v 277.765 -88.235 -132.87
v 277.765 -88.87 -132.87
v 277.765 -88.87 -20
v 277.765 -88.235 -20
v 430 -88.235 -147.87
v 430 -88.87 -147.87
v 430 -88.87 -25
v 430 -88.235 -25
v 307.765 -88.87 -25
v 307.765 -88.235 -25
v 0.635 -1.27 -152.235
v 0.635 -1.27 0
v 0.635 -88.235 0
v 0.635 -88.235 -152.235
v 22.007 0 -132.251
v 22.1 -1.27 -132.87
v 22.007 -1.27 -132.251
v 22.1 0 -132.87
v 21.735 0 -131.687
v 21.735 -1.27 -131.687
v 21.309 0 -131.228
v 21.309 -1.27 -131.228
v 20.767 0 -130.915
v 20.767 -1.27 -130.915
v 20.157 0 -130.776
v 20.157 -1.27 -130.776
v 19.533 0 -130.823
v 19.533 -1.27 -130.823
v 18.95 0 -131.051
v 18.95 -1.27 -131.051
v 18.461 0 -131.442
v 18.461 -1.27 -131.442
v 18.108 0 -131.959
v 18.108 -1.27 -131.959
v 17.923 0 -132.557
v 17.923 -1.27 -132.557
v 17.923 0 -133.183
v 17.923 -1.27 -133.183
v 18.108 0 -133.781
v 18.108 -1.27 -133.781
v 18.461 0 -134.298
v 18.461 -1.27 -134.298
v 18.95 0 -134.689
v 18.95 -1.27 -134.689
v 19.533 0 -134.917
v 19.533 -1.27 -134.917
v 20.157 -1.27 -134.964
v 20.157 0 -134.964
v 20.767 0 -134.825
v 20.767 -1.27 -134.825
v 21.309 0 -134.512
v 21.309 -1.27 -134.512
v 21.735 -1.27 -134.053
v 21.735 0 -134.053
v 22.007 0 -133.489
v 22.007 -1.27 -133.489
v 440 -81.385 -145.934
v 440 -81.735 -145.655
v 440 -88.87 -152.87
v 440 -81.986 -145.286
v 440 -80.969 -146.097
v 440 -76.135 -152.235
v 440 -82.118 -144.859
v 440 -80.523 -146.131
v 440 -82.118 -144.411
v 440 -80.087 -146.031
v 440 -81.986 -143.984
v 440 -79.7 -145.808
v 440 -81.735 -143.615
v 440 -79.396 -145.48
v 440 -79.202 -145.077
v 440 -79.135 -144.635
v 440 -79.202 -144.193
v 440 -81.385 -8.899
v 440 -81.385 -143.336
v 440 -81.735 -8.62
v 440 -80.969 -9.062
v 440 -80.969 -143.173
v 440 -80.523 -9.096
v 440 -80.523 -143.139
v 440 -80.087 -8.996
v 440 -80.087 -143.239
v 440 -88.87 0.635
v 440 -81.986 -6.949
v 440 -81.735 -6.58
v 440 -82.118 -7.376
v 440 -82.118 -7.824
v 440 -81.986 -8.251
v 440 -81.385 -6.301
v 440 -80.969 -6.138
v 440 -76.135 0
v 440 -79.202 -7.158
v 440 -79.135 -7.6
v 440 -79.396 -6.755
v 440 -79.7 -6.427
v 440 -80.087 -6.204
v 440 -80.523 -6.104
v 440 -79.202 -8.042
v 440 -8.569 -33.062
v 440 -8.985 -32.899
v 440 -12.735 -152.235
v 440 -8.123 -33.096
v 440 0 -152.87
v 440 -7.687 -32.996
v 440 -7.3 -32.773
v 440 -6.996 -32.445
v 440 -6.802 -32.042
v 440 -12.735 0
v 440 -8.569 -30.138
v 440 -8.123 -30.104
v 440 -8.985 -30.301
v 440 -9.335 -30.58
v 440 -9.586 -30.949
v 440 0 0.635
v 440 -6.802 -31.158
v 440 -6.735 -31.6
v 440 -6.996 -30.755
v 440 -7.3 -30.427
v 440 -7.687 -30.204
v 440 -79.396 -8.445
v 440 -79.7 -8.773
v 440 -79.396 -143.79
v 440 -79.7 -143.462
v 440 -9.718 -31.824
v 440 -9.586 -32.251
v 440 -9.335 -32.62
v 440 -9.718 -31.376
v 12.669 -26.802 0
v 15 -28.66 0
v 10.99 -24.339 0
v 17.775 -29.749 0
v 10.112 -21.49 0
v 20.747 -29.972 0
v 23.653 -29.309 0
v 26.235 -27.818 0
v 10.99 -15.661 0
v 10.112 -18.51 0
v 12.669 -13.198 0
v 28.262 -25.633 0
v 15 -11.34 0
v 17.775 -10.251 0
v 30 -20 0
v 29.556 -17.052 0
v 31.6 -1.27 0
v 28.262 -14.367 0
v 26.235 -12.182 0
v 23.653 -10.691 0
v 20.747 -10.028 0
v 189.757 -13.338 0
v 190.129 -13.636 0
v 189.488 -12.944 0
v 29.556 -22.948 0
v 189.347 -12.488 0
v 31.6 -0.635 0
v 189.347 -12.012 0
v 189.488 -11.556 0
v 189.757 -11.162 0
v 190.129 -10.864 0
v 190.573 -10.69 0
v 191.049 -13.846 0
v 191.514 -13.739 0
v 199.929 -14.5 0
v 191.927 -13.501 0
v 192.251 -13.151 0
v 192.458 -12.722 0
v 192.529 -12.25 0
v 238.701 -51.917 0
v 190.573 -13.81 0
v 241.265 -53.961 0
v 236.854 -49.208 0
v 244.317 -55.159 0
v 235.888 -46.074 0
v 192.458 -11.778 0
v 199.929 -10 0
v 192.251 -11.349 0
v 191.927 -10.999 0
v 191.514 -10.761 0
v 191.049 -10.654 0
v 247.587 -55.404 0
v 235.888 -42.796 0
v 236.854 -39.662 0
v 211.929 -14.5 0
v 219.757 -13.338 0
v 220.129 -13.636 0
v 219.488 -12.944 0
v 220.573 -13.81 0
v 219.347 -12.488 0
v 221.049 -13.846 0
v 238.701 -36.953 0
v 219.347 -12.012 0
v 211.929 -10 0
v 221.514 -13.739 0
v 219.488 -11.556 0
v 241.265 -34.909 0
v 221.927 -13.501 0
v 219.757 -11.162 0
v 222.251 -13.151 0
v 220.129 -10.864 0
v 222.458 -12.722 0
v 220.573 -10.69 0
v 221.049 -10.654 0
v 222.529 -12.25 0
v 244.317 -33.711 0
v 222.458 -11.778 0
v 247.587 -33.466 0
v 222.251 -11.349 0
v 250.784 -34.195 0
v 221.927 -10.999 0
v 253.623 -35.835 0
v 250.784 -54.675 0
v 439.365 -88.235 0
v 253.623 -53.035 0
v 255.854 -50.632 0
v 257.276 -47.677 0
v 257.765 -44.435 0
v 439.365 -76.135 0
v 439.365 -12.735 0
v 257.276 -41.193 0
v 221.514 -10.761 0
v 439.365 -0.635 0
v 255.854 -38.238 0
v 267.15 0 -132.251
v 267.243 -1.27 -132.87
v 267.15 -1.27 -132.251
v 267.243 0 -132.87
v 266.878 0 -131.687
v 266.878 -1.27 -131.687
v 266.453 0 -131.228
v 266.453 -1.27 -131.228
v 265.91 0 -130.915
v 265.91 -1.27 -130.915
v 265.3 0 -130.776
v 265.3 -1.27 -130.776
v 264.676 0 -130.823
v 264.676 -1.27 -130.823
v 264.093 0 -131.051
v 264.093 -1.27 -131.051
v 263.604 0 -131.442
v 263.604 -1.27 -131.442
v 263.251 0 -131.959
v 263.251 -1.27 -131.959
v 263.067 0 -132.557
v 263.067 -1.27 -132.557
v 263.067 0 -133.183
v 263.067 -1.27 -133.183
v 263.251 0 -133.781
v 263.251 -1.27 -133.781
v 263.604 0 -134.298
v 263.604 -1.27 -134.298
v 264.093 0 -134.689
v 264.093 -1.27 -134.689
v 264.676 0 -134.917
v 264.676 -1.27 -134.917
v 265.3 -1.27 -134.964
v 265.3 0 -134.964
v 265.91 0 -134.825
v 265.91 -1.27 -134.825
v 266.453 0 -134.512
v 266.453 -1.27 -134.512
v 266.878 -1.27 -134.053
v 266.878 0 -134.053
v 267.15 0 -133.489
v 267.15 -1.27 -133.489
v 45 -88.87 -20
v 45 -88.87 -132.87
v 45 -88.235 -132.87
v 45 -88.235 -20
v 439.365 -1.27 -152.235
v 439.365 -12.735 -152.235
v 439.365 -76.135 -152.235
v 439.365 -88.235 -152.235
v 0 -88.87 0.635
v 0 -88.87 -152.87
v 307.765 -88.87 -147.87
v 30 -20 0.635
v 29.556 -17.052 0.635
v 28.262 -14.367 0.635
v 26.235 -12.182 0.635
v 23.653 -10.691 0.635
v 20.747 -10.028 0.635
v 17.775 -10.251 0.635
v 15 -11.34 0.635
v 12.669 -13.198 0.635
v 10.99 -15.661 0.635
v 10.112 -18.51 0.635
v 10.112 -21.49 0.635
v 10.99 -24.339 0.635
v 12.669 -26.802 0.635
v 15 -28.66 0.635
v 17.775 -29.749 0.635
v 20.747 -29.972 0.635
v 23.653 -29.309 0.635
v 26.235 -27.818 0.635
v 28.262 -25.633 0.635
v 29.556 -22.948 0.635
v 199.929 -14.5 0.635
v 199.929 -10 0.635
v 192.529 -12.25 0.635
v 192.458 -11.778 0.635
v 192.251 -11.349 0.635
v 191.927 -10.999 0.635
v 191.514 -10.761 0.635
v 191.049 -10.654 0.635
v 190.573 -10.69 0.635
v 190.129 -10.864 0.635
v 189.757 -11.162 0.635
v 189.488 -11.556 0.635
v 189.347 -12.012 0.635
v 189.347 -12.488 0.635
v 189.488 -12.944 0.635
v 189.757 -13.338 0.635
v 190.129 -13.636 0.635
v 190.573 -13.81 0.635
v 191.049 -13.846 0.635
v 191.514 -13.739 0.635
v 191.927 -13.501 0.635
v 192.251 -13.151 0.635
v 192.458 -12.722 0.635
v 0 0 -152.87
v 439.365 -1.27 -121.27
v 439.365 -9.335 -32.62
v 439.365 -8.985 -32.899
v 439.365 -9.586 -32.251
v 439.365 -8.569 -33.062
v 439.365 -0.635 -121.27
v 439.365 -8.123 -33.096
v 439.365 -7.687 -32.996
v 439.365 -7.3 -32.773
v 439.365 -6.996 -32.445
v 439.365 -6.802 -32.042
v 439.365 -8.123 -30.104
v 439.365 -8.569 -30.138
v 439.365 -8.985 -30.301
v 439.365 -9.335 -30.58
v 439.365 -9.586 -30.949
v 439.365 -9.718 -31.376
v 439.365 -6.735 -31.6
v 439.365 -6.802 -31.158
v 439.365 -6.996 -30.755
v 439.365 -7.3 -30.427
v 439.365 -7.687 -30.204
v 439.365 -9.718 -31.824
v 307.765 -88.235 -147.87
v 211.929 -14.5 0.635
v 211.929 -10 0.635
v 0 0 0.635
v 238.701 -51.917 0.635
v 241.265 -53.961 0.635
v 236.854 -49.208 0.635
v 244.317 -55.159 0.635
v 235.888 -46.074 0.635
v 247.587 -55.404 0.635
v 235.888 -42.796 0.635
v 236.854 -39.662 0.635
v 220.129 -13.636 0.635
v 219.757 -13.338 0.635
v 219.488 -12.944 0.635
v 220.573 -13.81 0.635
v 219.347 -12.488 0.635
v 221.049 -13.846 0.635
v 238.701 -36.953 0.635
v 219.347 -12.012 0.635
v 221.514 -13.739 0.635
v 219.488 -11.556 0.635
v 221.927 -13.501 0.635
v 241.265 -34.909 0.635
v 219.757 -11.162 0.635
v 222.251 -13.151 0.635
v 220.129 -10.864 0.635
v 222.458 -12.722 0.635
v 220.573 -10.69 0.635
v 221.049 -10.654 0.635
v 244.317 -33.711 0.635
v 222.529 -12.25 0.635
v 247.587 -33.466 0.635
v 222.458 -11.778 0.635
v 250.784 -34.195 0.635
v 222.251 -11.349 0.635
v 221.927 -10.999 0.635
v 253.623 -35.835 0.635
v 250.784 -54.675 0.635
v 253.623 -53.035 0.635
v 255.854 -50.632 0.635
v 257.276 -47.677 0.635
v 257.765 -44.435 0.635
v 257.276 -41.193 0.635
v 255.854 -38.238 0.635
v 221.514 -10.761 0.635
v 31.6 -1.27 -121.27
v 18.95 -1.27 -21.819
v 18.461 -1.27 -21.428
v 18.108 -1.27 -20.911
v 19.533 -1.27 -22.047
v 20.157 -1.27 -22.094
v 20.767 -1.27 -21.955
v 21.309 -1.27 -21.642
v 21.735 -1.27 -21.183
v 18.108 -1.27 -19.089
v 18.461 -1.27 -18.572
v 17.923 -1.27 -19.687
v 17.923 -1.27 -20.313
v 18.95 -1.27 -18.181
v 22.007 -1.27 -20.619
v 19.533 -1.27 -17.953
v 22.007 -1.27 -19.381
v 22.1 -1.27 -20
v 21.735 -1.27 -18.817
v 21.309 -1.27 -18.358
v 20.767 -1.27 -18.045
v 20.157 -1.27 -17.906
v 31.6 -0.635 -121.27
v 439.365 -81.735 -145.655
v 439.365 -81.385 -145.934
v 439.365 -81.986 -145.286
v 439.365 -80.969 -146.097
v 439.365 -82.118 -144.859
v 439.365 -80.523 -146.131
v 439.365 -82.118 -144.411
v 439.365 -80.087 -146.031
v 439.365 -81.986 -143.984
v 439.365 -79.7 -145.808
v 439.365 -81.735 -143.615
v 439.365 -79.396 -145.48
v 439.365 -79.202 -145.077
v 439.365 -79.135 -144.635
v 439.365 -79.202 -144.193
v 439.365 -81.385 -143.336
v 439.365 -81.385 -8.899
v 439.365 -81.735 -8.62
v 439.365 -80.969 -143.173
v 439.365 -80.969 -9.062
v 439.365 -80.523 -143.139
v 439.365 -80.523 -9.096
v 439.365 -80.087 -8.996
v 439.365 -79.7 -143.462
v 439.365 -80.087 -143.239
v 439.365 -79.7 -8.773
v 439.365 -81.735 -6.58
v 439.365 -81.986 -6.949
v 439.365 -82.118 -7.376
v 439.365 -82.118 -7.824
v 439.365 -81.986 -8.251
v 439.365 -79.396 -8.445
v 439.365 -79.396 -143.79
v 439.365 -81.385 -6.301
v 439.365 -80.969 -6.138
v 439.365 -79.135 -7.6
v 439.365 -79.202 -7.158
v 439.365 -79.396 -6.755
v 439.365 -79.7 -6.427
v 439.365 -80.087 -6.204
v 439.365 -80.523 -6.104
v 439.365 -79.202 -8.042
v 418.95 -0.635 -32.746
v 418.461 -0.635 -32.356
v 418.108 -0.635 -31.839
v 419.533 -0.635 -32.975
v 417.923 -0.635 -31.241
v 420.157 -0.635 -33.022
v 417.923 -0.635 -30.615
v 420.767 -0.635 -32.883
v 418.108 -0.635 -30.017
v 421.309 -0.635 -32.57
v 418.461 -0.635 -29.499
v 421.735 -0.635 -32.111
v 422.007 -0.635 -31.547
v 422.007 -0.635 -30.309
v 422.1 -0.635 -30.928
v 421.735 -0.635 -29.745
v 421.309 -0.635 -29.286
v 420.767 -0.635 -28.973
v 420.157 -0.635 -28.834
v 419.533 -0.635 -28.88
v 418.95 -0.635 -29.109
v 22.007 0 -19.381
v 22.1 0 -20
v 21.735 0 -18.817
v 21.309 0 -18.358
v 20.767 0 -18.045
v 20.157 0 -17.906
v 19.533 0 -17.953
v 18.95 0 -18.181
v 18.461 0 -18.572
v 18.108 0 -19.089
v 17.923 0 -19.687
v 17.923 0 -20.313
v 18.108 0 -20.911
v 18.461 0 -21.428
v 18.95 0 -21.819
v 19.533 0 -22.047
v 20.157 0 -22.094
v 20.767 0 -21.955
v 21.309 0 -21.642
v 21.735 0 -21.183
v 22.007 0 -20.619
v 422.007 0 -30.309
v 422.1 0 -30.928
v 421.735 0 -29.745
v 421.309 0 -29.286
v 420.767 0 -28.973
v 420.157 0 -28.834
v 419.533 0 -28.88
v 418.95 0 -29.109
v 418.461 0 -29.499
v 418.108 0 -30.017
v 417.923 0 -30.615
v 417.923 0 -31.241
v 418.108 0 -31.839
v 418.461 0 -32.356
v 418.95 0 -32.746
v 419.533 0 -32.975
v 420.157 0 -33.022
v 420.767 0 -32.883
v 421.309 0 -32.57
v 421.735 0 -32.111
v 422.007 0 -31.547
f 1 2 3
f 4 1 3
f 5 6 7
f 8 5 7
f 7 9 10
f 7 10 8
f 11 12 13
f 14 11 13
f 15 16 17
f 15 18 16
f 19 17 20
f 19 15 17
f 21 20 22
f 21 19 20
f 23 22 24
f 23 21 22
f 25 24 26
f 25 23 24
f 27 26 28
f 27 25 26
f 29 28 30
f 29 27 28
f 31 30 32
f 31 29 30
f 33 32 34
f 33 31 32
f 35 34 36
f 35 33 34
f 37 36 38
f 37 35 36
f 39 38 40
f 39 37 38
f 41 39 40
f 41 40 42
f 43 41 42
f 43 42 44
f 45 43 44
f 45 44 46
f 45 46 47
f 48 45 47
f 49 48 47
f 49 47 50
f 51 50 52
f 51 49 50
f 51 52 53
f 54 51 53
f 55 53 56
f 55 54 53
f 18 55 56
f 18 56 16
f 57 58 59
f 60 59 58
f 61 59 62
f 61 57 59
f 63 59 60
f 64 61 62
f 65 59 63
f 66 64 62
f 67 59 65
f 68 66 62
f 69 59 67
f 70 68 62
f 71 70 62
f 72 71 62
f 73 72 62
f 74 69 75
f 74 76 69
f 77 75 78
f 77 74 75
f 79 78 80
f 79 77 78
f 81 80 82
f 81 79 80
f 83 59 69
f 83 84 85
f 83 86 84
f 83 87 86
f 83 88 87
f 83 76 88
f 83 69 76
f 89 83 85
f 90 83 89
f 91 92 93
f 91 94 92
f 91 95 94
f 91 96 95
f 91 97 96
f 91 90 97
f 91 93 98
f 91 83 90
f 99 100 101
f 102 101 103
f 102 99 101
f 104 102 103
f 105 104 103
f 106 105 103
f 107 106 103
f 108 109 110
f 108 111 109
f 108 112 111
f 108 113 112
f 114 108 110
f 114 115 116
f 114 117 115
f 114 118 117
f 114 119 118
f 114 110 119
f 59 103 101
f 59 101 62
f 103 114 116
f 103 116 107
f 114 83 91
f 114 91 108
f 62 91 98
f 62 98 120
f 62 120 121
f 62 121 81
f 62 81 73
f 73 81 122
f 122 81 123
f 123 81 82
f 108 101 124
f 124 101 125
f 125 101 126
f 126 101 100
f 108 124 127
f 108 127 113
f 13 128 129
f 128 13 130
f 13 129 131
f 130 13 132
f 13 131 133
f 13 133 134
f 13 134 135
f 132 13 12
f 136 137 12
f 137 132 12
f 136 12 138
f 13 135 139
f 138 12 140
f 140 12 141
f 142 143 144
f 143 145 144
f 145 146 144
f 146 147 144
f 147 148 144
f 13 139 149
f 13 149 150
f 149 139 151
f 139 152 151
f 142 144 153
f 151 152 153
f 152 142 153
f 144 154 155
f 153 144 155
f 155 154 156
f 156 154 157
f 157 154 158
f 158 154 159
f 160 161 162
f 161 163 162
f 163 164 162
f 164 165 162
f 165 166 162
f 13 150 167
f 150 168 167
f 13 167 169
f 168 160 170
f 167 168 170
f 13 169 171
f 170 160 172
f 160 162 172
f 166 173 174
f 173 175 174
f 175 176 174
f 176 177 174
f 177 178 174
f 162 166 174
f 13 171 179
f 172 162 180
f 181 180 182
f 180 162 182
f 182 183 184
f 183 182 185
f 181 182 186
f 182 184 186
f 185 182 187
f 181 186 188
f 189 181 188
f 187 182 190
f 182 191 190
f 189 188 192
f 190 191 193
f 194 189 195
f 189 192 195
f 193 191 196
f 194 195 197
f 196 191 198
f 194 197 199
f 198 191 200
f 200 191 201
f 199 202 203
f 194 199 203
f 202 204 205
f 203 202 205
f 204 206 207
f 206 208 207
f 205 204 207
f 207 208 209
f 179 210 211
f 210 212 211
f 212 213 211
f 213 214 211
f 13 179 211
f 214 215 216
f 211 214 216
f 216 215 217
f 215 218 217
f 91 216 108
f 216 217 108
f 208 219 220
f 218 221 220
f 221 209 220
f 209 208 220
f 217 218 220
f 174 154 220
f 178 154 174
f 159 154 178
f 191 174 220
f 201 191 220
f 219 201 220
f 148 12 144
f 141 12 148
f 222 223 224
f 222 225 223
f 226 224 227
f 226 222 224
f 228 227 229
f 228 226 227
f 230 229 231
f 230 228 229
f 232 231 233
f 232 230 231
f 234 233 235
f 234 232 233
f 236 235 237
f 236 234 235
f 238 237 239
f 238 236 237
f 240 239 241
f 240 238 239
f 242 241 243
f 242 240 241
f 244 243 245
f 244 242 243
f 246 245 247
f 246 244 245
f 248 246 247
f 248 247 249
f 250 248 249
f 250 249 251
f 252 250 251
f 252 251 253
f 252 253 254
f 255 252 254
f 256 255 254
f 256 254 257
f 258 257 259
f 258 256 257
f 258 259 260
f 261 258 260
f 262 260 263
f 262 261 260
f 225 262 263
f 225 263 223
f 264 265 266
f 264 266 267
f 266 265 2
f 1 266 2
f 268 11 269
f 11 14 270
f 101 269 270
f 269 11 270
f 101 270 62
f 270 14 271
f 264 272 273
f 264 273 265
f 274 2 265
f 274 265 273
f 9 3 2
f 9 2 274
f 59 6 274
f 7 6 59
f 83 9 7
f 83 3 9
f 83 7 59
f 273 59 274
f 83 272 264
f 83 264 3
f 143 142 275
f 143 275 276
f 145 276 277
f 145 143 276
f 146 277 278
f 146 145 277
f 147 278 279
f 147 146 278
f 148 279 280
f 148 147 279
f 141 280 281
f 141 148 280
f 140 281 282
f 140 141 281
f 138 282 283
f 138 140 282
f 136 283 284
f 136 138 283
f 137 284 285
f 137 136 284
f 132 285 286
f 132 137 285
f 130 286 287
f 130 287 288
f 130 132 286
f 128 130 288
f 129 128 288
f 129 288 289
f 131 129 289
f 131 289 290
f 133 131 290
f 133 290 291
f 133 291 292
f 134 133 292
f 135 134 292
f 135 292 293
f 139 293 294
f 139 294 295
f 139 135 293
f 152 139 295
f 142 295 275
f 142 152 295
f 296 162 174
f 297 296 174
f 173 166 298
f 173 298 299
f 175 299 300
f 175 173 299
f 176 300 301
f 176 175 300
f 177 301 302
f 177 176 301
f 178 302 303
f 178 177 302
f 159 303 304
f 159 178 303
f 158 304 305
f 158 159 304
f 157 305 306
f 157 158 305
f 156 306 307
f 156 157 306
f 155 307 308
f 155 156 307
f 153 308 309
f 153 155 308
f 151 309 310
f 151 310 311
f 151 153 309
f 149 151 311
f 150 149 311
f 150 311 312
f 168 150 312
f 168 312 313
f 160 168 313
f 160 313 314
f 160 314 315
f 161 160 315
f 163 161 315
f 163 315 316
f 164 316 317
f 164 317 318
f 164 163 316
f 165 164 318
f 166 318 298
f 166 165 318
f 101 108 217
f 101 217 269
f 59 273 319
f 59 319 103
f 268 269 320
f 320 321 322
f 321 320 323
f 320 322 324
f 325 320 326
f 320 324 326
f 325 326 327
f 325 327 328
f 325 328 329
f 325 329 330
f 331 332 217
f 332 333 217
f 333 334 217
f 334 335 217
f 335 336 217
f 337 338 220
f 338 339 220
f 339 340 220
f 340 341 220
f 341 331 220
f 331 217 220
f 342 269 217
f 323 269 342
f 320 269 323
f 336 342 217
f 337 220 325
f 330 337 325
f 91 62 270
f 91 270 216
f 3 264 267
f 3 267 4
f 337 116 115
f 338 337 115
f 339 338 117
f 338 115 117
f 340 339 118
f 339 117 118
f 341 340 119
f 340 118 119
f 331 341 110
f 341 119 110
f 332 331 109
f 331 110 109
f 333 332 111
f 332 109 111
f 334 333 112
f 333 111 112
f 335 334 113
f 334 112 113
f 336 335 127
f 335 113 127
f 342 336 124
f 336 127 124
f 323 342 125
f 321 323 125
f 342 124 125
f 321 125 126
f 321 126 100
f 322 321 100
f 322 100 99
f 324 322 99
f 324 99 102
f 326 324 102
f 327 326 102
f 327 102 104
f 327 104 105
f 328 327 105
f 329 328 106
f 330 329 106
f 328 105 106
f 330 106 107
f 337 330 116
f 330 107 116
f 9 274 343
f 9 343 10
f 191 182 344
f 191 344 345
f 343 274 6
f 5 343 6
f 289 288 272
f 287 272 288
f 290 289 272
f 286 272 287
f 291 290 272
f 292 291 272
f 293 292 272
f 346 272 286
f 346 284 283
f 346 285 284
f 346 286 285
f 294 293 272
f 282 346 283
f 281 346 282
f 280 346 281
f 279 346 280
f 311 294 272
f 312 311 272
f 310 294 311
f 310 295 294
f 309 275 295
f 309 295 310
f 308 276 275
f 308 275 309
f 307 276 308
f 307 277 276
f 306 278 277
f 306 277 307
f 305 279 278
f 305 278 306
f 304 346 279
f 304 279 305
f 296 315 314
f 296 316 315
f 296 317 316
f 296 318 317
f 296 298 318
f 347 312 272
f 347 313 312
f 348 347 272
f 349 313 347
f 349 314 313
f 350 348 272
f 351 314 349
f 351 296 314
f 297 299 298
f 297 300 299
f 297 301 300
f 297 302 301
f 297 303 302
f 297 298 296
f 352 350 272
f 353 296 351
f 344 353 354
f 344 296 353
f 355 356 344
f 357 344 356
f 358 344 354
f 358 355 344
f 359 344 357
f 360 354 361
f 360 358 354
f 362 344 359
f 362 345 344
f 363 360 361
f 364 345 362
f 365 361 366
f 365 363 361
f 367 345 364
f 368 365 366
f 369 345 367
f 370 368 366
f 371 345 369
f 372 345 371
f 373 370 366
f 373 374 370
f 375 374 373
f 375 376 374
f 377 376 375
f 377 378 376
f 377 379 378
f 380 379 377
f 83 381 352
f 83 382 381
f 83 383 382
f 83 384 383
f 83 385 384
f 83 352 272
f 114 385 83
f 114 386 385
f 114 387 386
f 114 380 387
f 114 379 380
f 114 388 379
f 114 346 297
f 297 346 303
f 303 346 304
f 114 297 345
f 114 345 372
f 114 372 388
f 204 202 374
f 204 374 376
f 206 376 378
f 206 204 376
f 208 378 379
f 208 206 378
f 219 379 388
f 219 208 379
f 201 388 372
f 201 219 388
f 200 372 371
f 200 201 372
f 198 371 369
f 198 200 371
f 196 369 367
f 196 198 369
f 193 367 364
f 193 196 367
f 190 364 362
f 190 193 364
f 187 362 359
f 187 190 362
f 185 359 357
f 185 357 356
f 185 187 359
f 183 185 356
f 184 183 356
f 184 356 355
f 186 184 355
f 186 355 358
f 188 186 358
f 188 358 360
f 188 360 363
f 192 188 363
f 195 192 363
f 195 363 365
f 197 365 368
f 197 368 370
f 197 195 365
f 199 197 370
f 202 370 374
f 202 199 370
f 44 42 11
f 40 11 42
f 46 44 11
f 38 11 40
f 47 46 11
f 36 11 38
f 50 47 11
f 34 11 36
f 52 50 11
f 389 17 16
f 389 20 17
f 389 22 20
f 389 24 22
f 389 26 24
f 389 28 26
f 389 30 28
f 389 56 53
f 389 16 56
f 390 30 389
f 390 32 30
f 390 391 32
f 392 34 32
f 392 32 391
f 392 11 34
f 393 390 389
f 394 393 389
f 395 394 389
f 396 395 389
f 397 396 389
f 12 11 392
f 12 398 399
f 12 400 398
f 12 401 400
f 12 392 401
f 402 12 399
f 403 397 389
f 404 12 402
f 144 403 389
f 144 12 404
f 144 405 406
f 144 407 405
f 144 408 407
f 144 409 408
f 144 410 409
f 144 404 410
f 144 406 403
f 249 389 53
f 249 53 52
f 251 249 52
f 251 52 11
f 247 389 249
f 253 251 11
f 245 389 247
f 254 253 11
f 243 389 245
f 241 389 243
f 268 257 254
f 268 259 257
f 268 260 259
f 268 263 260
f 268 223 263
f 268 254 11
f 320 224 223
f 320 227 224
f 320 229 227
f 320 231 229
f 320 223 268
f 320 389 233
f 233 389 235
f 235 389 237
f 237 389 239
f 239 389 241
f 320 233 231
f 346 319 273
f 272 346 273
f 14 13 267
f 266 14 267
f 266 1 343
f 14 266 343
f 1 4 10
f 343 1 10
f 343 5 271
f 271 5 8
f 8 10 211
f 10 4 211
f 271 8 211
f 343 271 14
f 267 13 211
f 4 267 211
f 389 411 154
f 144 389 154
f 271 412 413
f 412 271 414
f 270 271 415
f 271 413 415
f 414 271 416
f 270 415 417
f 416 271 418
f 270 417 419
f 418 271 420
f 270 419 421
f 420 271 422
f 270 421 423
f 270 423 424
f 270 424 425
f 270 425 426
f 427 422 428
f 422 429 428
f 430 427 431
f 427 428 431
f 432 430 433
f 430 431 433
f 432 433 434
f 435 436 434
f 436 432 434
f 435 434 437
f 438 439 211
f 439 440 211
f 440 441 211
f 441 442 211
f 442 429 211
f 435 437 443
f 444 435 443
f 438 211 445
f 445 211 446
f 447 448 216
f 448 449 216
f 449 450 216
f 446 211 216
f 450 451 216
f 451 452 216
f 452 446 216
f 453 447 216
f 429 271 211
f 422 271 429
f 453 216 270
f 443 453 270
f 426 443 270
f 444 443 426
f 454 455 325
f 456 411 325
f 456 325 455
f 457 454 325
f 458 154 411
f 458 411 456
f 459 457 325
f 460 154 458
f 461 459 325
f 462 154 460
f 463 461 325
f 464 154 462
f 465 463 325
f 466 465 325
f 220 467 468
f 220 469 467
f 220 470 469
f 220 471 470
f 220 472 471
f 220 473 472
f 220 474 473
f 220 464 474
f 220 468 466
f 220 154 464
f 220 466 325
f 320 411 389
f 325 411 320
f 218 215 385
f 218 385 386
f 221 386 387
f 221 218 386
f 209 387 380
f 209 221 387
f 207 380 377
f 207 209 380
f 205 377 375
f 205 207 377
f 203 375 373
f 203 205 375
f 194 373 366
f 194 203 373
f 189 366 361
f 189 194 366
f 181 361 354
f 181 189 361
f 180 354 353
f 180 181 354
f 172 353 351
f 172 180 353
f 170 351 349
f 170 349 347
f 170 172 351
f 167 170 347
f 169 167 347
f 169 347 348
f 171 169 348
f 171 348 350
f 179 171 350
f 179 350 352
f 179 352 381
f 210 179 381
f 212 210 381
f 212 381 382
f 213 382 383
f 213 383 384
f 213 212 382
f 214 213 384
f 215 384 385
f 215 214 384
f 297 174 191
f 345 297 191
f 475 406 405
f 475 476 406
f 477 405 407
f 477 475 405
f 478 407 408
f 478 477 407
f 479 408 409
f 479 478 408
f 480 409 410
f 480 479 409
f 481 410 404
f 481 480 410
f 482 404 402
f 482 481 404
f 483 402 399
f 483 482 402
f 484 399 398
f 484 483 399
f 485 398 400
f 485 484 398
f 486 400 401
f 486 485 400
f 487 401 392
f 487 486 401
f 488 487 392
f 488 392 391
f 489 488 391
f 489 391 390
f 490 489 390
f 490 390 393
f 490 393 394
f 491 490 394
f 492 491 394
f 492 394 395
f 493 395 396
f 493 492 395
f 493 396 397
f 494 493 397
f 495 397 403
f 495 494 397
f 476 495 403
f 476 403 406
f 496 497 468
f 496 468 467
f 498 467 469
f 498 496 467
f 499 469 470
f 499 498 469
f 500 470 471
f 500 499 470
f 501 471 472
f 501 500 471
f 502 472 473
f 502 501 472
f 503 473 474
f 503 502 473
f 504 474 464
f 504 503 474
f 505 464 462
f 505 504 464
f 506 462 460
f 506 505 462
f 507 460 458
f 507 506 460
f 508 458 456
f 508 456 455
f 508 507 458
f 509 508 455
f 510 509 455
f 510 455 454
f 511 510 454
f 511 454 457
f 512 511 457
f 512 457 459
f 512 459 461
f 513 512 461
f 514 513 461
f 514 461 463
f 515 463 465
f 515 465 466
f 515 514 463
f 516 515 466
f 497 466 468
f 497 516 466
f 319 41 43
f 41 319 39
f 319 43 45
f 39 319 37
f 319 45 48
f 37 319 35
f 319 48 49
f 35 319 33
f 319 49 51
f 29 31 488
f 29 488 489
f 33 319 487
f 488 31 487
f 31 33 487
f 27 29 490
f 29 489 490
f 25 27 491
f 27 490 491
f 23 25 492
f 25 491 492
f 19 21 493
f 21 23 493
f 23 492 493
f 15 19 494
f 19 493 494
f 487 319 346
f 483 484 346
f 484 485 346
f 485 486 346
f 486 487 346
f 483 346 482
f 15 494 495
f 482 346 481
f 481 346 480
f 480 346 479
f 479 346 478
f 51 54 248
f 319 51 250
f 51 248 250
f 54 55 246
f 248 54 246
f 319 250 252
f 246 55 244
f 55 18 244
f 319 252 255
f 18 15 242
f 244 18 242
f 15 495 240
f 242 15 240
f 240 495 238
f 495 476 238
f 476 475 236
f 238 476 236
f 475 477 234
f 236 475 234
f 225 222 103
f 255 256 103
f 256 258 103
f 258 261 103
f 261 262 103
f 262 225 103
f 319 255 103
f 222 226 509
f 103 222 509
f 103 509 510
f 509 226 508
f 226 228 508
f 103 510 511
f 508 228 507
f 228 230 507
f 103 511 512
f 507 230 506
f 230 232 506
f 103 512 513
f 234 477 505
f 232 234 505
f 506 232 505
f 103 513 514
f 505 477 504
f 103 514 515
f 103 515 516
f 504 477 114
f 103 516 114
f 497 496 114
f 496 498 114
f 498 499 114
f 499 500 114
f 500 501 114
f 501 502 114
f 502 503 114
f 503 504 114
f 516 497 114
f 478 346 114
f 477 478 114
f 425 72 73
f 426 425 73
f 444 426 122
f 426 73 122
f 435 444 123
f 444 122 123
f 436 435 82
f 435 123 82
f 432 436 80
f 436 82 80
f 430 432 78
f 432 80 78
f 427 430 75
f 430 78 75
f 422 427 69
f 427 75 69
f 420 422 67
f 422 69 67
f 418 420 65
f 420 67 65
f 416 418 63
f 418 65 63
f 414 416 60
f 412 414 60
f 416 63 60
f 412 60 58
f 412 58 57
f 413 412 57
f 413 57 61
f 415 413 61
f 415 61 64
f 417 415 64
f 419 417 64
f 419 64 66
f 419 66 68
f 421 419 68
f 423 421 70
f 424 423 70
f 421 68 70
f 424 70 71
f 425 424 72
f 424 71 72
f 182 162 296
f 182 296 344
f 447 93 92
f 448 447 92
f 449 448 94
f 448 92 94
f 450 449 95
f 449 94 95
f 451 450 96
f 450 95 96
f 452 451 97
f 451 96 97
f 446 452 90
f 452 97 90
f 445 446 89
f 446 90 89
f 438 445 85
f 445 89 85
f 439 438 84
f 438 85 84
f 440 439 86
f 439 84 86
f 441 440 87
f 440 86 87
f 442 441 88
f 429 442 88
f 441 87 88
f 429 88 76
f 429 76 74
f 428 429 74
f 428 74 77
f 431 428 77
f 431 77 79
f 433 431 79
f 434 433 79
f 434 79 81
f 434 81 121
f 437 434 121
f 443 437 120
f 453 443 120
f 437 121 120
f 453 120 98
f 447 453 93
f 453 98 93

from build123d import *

# Parameters (mm, degrees)
F0_W      = 440
F0_H      = 88.87
F0_R      = 10
F0_R_2    = 1.6
F0_W_2    = 12
F0_H_2    = 4.5
F0_R_3    = 11
F1_DEPTH  = 0.635
F2_W      = 440
F2_H      = 152.87
F2_R      = 2.1
F3_DEPTH  = 0.635
F4_W      = 440
F4_H      = 152.87
F4_W_2    = 232.765
F4_H_2    = 112.87
F4_W_3    = 122.235
F4_H_3    = 122.87
F5_DEPTH  = 0.635
F6_W      = 440
F6_H      = 87.6
F7_DEPTH  = 0.635
F8_W      = 440
F8_H      = 30.965
F8_R      = 2.1
F9_DEPTH  = 0.635
F11_W     = 31.6
F11_H     = 121.27
F11_R     = 2.1
F12_DEPTH = 0.635
F13_DEPTH = 0.635
F14_W     = 12.1
F14_H     = 152.235
F14_R     = 1.5
F15_DEPTH = 0.635


with BuildPart() as f1:
    # F0 (on Top) → F1 (new body)
    with BuildSketch(Plane.XY):
        with Locations((220, -44.435)):
            Rectangle(F0_W, F0_H)
        with Locations((20, -20)):
            Circle(F0_R, mode=Mode.SUBTRACT)
        with Locations((190.92939, -12.25)):
            Circle(F0_R_2, mode=Mode.SUBTRACT)
        with Locations((205.92939, -12.25)):
            Rectangle(F0_W_2, F0_H_2, mode=Mode.SUBTRACT)
        with Locations((246.765, -44.435)):
            Circle(F0_R_3, mode=Mode.SUBTRACT)
        with Locations((220.92939, -12.25)):
            Circle(F0_R_2, mode=Mode.SUBTRACT)
    extrude(amount=F1_DEPTH)

    # F2 (on Front) → F3 (join)
    with BuildSketch(Plane.XZ):
        with Locations((220, -76.435)):
            Rectangle(F2_W, F2_H)
        with Locations((20, -132.87)):
            Circle(F2_R, mode=Mode.SUBTRACT)
        with Locations((265.143272, -132.87)):
            Circle(F2_R, mode=Mode.SUBTRACT)
        with Locations((20, -20)):
            Circle(F2_R, mode=Mode.SUBTRACT)
        with Locations((420, -30.92768)):
            Circle(F2_R, mode=Mode.SUBTRACT)
    extrude(amount=F3_DEPTH)

    # F4 (on face) → F5 (join)
    with BuildSketch(Plane.XZ.offset(88.87)):
        with Locations((220, -76.435)):
            Rectangle(F4_W, F4_H)
        with Locations((161.3825, -76.435)):
            Rectangle(F4_W_2, F4_H_2, mode=Mode.SUBTRACT)
        with Locations((368.8825, -86.435)):
            Rectangle(F4_W_3, F4_H_3, mode=Mode.SUBTRACT)
    extrude(amount=-F5_DEPTH)

    # F6 (on face) → F7 (join)
    with BuildSketch(Plane(origin=(0, 0, -152.87), x_dir=(1, 0, 0), z_dir=(0, 0, -1))):
        with Locations((220, 44.435)):
            Rectangle(F6_W, F6_H)
    extrude(amount=-F7_DEPTH)

    # F8 (on face) → F9 (join)
    with BuildSketch(Plane.XZ.offset(0.635)):
        with Locations((220, -136.7525)):
            Rectangle(F8_W, F8_H)
        with Locations((20, -132.87)):
            Circle(F8_R, mode=Mode.SUBTRACT)
        with Locations((265.143272, -132.87)):
            Circle(F8_R, mode=Mode.SUBTRACT)
    extrude(amount=F9_DEPTH)

    # F11 (on face) → F12 (join)
    with BuildSketch(Plane.XZ.offset(0.635)):
        with Locations((15.8, -60.635)):
            Rectangle(F11_W, F11_H)
        with Locations((20, -20)):
            Circle(F11_R, mode=Mode.SUBTRACT)
    extrude(amount=F12_DEPTH)

    # F10 (on face) → F13 (join)
    with BuildSketch(Plane(origin=(0, 0, 0), x_dir=(0, -1, 0), z_dir=(-1, 0, 0))):
        Polygon((88.235, 0), (0.635, 0), (0.635, -121.27), (1.27, -121.27), (1.27, -152.235), (88.235, -152.235), align=None)
    extrude(amount=-F13_DEPTH)

    # F14 (on face) → F15 (join)
    with BuildSketch(Plane.YZ.offset(440)):
        with Locations((-82.185, -76.1175)):
            Rectangle(F14_W, F14_H)
        with Locations((-80.635, -144.635)):
            Circle(F14_R, mode=Mode.SUBTRACT)
        with Locations((-80.635, -7.6)):
            Circle(F14_R, mode=Mode.SUBTRACT)
        Polygon((-0.635, 0), (-12.735, 0), (-12.735, -152.235), (-1.27, -152.235), (-1.27, -121.27), (-0.635, -121.27), align=None)
        with Locations((-8.235, -31.6)):
            Circle(F14_R, mode=Mode.SUBTRACT)
    extrude(amount=-F15_DEPTH)


solid = f1.part
